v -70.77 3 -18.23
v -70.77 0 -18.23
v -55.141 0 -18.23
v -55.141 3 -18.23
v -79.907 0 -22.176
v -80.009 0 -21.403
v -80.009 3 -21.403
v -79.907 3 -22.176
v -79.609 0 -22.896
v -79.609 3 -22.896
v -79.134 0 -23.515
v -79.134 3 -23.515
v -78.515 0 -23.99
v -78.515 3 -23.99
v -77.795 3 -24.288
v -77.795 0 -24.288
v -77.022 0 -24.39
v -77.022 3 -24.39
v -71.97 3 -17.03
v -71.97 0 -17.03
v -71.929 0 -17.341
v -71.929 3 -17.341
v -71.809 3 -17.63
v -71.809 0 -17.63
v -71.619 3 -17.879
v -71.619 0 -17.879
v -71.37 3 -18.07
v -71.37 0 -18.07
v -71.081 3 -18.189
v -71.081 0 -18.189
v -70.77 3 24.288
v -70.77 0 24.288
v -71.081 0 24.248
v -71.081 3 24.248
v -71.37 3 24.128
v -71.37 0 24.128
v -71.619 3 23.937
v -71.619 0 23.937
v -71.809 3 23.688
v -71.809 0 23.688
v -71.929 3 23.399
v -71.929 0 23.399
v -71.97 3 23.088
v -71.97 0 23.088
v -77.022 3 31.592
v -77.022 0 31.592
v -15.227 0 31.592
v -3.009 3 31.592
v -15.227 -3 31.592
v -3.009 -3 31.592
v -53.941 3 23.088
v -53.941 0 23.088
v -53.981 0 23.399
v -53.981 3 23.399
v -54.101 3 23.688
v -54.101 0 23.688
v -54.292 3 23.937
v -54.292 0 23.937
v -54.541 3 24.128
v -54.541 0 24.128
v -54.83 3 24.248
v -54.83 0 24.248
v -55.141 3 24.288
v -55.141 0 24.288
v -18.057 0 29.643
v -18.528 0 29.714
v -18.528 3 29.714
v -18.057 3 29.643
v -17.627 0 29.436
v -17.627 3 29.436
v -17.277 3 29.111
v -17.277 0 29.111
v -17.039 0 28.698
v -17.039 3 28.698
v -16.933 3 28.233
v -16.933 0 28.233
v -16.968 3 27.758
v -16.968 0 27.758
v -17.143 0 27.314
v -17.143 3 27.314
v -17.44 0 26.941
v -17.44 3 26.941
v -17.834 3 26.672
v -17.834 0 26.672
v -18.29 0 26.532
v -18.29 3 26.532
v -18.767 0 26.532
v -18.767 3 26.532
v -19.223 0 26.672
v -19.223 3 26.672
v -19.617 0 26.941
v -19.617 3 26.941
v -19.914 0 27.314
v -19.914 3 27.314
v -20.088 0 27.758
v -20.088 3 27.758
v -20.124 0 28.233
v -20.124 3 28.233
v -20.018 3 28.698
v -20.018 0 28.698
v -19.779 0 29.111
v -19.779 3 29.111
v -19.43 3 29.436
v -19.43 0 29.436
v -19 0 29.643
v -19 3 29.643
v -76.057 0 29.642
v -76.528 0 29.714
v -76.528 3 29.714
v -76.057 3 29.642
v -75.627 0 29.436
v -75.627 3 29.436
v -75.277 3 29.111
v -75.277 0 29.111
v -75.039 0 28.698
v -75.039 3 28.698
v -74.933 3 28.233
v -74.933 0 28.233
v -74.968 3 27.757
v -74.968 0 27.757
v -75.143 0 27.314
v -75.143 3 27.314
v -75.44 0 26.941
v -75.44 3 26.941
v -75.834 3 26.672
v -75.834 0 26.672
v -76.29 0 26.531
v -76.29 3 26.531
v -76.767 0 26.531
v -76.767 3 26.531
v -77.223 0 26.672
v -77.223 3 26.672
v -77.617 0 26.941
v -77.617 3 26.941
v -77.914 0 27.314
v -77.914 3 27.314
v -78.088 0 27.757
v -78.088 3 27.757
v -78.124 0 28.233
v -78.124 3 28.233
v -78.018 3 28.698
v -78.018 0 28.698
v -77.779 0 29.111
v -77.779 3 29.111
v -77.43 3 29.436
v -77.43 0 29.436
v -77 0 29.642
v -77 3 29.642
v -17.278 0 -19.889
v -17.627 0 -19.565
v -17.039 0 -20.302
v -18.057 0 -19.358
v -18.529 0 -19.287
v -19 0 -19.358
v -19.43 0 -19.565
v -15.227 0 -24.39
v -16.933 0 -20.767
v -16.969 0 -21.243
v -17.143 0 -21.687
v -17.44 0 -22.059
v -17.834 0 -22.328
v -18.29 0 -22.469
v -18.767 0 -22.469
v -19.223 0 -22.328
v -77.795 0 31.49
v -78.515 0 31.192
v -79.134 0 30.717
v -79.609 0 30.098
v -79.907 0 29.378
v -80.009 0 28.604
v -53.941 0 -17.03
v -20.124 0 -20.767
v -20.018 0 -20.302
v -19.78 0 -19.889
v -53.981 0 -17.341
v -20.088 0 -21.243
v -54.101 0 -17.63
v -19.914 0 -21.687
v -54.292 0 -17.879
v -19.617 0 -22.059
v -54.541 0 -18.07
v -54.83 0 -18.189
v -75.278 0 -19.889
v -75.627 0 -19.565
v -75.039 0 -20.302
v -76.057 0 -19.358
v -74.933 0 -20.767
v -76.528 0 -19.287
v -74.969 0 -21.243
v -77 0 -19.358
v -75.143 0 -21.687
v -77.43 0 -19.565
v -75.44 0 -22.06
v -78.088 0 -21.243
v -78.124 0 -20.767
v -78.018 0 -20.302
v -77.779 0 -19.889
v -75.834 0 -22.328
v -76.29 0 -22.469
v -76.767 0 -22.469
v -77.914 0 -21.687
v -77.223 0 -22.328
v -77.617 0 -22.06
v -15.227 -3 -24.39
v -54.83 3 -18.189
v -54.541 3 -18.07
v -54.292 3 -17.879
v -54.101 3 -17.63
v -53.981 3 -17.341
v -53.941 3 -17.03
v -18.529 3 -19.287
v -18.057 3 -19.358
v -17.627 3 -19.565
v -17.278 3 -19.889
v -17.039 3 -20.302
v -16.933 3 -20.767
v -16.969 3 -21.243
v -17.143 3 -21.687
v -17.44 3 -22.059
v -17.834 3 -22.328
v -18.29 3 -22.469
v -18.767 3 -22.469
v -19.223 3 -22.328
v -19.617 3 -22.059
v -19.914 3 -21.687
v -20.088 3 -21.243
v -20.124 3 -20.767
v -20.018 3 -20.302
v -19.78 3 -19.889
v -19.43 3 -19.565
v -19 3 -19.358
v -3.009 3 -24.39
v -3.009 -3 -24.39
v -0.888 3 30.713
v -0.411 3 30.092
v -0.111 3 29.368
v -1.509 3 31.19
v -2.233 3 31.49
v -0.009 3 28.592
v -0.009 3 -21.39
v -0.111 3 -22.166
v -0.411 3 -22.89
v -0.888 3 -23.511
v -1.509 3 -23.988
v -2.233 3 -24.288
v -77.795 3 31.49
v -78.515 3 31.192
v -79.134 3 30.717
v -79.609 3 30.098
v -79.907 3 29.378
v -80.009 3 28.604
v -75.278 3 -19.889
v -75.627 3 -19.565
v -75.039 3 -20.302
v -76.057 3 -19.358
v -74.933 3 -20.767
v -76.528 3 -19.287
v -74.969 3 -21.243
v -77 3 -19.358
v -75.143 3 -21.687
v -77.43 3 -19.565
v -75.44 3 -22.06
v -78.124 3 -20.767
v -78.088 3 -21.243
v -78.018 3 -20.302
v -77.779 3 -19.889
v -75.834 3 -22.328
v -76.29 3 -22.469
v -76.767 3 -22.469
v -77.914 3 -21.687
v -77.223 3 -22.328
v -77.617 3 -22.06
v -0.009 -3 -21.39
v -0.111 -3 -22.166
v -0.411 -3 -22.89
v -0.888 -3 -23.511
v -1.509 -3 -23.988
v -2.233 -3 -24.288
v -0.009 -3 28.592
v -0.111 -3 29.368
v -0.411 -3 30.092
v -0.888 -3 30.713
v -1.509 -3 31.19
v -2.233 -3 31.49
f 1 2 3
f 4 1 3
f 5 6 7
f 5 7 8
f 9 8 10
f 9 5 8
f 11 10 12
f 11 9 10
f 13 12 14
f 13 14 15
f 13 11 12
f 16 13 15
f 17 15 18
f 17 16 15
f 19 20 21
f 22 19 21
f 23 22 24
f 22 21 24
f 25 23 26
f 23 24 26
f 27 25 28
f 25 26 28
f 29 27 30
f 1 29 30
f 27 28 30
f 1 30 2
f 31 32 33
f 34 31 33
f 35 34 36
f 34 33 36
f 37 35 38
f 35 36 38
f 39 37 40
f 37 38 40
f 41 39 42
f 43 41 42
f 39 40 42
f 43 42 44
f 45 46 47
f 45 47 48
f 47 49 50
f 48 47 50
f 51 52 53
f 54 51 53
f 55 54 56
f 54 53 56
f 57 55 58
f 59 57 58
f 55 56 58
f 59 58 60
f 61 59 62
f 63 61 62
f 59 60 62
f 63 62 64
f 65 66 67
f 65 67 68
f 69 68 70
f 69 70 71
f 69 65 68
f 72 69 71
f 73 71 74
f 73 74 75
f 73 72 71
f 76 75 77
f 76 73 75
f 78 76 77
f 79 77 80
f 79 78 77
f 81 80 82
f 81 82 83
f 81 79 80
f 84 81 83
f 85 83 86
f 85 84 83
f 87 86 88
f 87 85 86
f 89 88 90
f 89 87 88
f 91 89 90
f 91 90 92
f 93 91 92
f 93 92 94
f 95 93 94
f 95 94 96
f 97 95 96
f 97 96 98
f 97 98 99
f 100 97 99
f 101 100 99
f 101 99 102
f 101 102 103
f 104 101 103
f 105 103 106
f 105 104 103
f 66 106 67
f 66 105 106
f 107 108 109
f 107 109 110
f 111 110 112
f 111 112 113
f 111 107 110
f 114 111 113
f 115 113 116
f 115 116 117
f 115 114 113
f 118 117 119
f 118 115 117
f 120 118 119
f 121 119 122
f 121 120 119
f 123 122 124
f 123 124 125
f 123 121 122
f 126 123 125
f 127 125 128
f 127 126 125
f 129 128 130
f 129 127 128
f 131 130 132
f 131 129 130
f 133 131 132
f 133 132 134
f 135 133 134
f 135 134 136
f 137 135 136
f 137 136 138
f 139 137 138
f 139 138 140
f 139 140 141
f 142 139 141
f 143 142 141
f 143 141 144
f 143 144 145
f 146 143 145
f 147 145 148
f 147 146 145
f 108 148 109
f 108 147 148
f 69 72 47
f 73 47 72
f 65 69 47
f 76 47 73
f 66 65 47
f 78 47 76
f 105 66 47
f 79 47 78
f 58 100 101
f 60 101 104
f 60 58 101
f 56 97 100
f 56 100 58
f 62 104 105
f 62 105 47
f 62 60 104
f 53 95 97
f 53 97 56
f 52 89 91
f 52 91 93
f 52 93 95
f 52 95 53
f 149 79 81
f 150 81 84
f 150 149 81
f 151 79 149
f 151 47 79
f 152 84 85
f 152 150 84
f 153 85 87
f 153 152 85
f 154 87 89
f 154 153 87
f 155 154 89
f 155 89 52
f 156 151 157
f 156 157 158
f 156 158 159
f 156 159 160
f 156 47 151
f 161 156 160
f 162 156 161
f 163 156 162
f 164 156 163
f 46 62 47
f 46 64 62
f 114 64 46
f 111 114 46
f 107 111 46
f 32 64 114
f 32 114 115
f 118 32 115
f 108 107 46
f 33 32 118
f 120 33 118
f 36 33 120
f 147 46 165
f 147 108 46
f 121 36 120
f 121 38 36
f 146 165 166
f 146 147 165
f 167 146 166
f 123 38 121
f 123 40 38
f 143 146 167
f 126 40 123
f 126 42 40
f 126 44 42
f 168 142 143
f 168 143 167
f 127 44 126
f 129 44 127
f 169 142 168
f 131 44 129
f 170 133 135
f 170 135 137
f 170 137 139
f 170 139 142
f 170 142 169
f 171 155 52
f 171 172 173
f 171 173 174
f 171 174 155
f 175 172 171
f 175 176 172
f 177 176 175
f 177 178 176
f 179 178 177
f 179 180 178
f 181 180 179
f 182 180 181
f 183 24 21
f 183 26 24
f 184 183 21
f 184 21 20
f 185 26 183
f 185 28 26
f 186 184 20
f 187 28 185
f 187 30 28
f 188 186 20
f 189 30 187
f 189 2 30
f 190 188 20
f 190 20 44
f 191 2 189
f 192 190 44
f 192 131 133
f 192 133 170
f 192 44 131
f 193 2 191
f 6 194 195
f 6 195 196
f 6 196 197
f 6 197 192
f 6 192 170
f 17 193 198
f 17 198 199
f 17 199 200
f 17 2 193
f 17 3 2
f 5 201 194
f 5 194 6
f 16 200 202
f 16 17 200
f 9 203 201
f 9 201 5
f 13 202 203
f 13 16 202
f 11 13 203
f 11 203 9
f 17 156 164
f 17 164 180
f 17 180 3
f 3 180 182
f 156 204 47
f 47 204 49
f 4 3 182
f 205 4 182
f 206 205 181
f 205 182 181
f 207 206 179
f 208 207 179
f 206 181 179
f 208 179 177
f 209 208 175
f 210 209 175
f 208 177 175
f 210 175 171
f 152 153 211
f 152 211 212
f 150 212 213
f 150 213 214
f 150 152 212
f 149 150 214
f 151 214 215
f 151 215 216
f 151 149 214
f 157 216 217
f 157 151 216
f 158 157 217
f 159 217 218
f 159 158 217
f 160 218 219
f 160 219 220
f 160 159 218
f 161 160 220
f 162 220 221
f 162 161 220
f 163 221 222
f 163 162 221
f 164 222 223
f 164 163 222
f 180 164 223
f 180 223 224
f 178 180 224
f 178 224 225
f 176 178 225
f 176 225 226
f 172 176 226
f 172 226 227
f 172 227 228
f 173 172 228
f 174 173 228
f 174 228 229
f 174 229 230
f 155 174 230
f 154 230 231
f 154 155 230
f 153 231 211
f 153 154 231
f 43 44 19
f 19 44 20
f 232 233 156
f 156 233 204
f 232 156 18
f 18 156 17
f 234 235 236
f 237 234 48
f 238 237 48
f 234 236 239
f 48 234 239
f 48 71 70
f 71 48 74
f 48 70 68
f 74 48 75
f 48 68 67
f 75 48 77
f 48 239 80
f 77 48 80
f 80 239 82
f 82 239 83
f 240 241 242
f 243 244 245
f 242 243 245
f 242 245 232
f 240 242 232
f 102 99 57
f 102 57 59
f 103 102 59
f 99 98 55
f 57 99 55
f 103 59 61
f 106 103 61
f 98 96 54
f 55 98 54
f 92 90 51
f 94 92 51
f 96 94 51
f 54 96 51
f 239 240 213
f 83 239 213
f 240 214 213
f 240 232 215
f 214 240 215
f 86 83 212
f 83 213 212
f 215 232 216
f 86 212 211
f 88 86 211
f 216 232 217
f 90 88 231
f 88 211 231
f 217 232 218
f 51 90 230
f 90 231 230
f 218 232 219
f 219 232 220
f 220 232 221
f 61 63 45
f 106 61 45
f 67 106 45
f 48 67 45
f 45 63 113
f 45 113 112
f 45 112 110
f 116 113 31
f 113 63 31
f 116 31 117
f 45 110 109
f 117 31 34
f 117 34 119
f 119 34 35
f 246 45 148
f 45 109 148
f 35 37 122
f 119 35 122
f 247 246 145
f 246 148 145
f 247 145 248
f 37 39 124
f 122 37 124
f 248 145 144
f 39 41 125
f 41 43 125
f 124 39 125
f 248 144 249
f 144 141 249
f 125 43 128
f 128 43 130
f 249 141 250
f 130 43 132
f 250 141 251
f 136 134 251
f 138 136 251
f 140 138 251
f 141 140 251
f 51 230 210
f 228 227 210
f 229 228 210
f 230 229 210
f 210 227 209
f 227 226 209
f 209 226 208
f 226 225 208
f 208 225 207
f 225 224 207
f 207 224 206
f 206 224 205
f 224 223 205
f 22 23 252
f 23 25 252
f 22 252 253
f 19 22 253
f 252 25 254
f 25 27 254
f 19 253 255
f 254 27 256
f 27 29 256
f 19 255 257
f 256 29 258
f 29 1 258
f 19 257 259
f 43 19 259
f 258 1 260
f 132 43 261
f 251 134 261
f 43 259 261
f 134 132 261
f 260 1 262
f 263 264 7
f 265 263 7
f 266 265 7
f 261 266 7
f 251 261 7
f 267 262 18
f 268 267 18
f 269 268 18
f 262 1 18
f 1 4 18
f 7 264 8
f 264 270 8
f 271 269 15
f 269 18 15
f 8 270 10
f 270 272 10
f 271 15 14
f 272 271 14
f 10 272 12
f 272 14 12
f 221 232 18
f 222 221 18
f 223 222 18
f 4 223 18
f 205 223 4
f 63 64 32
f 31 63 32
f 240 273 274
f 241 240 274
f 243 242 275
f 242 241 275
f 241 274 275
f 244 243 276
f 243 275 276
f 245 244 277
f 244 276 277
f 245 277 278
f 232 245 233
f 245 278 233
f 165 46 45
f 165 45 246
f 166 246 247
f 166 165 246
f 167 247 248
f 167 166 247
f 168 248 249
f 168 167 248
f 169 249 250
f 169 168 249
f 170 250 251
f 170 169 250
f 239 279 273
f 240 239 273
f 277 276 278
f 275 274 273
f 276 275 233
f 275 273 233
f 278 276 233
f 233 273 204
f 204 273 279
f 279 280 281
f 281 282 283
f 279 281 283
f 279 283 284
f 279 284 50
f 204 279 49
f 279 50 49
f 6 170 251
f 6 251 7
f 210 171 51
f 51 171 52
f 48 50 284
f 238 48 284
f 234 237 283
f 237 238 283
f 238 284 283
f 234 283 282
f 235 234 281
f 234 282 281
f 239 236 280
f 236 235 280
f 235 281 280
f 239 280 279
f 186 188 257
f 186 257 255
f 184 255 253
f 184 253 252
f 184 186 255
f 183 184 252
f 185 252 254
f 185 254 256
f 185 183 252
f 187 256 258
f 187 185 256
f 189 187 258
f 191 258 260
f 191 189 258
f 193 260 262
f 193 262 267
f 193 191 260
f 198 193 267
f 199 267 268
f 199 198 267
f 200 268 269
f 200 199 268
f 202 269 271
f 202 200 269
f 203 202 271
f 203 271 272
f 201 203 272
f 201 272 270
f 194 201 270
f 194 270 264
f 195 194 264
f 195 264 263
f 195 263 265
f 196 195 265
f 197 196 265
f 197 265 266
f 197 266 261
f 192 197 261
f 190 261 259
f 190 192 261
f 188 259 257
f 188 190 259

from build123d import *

# Parameters (mm, degrees)
SKETCH_1_R      = 1.6
EXTRUDE_1_DEPTH = 3
EXTRUDE_START   = 3
EXTRUDE_3_DEPTH = 3


with BuildPart() as part:
    # 草图1 → 凸台-拉伸1 (new body)
    with BuildSketch(Plane(origin=(0, 0, 0), x_dir=(1, 0, 0), z_dir=(0, 1, 0))):
        with BuildLine():
            Line((-0.009028181, 21.389975432), (-0.009028181, -28.591736531))
            ThreePointArc((-0.009028181, -28.591736531), (-0.887707838, -30.713056875), (-3.009028181, -31.591736531))
            Line((-3.009028181, -31.591736531), (-77.021723127, -31.591736531))
            ThreePointArc((-77.021723127, -31.591736531), (-79.134066788, -30.716775138), (-80.009028181, -28.604431477))
            Line((-80.009028181, -28.604431477), (-80.009028181, 21.402670377))
            ThreePointArc((-80.009028181, 21.402670377), (-79.134066788, 23.515014039), (-77.021723127, 24.389975432))
            Line((-77.021723127, 24.389975432), (-3.009028181, 24.389975432))
            ThreePointArc((-3.009028181, 24.389975432), (-0.887707838, 23.511295776), (-0.009028181, 21.389975432))
        make_face()
        with Locations(Location((-76.52848462, 20.886724226, 0), (0, 0, 270))):
            Circle(SKETCH_1_R, mode=Mode.SUBTRACT)
        with Locations(Location((-18.52858622, 20.886597225, 0), (0, 0, 270))):
            Circle(SKETCH_1_R, mode=Mode.SUBTRACT)
        with Locations(Location((-18.52833222, -28.113656775, 0), (0, 0, 270))):
            Circle(SKETCH_1_R, mode=Mode.SUBTRACT)
        with Locations(Location((-76.52833222, -28.113529775, 0), (0, 0, 270))):
            Circle(SKETCH_1_R, mode=Mode.SUBTRACT)
        with BuildLine():
            Line((-70.770059731, 18.230282987), (-55.140568984, 18.230282987))
            ThreePointArc((-55.140568984, 18.230282987), (-54.292040846, 17.878811124), (-53.940568984, 17.030282987))
            Line((-53.940568984, 17.030282987), (-53.940568984, -23.088422311))
            ThreePointArc((-53.940568984, -23.088422311), (-54.292040846, -23.936950448), (-55.140568984, -24.288422311))
            Line((-55.140568984, -24.288422311), (-70.770059731, -24.288422311))
            ThreePointArc((-70.770059731, -24.288422311), (-71.618587868, -23.936950448), (-71.970059731, -23.088422311))
            Line((-71.970059731, -23.088422311), (-71.970059731, 17.030282987))
            ThreePointArc((-71.970059731, 17.030282987), (-71.618587868, 17.878811124), (-70.770059731, 18.230282987))
        make_face(mode=Mode.SUBTRACT)
    extrude(amount=EXTRUDE_1_DEPTH)

    # 草图3 → 凸台-拉伸3 (add)
    with BuildSketch(Plane.XZ.offset(EXTRUDE_START)):
        with BuildLine():
            Line((-15.227079657, 31.591736531), (-3.009028181, 31.591736531))
            ThreePointArc((-3.009028181, 31.591736531), (-0.887707838, 30.713056875), (-0.009028181, 28.591736531))
            Line((-0.009028181, 28.591736531), (-0.009028181, -21.389975432))
            ThreePointArc((-0.009028181, -21.389975432), (-0.887707838, -23.511295776), (-3.009028181, -24.389975432))
            Line((-3.009028181, -24.389975432), (-15.227079657, -24.389975432))
            Line((-15.227079657, -24.389975432), (-15.227079657, 31.591736531))
        make_face()
    extrude(amount=-EXTRUDE_3_DEPTH)


solid = part.part
